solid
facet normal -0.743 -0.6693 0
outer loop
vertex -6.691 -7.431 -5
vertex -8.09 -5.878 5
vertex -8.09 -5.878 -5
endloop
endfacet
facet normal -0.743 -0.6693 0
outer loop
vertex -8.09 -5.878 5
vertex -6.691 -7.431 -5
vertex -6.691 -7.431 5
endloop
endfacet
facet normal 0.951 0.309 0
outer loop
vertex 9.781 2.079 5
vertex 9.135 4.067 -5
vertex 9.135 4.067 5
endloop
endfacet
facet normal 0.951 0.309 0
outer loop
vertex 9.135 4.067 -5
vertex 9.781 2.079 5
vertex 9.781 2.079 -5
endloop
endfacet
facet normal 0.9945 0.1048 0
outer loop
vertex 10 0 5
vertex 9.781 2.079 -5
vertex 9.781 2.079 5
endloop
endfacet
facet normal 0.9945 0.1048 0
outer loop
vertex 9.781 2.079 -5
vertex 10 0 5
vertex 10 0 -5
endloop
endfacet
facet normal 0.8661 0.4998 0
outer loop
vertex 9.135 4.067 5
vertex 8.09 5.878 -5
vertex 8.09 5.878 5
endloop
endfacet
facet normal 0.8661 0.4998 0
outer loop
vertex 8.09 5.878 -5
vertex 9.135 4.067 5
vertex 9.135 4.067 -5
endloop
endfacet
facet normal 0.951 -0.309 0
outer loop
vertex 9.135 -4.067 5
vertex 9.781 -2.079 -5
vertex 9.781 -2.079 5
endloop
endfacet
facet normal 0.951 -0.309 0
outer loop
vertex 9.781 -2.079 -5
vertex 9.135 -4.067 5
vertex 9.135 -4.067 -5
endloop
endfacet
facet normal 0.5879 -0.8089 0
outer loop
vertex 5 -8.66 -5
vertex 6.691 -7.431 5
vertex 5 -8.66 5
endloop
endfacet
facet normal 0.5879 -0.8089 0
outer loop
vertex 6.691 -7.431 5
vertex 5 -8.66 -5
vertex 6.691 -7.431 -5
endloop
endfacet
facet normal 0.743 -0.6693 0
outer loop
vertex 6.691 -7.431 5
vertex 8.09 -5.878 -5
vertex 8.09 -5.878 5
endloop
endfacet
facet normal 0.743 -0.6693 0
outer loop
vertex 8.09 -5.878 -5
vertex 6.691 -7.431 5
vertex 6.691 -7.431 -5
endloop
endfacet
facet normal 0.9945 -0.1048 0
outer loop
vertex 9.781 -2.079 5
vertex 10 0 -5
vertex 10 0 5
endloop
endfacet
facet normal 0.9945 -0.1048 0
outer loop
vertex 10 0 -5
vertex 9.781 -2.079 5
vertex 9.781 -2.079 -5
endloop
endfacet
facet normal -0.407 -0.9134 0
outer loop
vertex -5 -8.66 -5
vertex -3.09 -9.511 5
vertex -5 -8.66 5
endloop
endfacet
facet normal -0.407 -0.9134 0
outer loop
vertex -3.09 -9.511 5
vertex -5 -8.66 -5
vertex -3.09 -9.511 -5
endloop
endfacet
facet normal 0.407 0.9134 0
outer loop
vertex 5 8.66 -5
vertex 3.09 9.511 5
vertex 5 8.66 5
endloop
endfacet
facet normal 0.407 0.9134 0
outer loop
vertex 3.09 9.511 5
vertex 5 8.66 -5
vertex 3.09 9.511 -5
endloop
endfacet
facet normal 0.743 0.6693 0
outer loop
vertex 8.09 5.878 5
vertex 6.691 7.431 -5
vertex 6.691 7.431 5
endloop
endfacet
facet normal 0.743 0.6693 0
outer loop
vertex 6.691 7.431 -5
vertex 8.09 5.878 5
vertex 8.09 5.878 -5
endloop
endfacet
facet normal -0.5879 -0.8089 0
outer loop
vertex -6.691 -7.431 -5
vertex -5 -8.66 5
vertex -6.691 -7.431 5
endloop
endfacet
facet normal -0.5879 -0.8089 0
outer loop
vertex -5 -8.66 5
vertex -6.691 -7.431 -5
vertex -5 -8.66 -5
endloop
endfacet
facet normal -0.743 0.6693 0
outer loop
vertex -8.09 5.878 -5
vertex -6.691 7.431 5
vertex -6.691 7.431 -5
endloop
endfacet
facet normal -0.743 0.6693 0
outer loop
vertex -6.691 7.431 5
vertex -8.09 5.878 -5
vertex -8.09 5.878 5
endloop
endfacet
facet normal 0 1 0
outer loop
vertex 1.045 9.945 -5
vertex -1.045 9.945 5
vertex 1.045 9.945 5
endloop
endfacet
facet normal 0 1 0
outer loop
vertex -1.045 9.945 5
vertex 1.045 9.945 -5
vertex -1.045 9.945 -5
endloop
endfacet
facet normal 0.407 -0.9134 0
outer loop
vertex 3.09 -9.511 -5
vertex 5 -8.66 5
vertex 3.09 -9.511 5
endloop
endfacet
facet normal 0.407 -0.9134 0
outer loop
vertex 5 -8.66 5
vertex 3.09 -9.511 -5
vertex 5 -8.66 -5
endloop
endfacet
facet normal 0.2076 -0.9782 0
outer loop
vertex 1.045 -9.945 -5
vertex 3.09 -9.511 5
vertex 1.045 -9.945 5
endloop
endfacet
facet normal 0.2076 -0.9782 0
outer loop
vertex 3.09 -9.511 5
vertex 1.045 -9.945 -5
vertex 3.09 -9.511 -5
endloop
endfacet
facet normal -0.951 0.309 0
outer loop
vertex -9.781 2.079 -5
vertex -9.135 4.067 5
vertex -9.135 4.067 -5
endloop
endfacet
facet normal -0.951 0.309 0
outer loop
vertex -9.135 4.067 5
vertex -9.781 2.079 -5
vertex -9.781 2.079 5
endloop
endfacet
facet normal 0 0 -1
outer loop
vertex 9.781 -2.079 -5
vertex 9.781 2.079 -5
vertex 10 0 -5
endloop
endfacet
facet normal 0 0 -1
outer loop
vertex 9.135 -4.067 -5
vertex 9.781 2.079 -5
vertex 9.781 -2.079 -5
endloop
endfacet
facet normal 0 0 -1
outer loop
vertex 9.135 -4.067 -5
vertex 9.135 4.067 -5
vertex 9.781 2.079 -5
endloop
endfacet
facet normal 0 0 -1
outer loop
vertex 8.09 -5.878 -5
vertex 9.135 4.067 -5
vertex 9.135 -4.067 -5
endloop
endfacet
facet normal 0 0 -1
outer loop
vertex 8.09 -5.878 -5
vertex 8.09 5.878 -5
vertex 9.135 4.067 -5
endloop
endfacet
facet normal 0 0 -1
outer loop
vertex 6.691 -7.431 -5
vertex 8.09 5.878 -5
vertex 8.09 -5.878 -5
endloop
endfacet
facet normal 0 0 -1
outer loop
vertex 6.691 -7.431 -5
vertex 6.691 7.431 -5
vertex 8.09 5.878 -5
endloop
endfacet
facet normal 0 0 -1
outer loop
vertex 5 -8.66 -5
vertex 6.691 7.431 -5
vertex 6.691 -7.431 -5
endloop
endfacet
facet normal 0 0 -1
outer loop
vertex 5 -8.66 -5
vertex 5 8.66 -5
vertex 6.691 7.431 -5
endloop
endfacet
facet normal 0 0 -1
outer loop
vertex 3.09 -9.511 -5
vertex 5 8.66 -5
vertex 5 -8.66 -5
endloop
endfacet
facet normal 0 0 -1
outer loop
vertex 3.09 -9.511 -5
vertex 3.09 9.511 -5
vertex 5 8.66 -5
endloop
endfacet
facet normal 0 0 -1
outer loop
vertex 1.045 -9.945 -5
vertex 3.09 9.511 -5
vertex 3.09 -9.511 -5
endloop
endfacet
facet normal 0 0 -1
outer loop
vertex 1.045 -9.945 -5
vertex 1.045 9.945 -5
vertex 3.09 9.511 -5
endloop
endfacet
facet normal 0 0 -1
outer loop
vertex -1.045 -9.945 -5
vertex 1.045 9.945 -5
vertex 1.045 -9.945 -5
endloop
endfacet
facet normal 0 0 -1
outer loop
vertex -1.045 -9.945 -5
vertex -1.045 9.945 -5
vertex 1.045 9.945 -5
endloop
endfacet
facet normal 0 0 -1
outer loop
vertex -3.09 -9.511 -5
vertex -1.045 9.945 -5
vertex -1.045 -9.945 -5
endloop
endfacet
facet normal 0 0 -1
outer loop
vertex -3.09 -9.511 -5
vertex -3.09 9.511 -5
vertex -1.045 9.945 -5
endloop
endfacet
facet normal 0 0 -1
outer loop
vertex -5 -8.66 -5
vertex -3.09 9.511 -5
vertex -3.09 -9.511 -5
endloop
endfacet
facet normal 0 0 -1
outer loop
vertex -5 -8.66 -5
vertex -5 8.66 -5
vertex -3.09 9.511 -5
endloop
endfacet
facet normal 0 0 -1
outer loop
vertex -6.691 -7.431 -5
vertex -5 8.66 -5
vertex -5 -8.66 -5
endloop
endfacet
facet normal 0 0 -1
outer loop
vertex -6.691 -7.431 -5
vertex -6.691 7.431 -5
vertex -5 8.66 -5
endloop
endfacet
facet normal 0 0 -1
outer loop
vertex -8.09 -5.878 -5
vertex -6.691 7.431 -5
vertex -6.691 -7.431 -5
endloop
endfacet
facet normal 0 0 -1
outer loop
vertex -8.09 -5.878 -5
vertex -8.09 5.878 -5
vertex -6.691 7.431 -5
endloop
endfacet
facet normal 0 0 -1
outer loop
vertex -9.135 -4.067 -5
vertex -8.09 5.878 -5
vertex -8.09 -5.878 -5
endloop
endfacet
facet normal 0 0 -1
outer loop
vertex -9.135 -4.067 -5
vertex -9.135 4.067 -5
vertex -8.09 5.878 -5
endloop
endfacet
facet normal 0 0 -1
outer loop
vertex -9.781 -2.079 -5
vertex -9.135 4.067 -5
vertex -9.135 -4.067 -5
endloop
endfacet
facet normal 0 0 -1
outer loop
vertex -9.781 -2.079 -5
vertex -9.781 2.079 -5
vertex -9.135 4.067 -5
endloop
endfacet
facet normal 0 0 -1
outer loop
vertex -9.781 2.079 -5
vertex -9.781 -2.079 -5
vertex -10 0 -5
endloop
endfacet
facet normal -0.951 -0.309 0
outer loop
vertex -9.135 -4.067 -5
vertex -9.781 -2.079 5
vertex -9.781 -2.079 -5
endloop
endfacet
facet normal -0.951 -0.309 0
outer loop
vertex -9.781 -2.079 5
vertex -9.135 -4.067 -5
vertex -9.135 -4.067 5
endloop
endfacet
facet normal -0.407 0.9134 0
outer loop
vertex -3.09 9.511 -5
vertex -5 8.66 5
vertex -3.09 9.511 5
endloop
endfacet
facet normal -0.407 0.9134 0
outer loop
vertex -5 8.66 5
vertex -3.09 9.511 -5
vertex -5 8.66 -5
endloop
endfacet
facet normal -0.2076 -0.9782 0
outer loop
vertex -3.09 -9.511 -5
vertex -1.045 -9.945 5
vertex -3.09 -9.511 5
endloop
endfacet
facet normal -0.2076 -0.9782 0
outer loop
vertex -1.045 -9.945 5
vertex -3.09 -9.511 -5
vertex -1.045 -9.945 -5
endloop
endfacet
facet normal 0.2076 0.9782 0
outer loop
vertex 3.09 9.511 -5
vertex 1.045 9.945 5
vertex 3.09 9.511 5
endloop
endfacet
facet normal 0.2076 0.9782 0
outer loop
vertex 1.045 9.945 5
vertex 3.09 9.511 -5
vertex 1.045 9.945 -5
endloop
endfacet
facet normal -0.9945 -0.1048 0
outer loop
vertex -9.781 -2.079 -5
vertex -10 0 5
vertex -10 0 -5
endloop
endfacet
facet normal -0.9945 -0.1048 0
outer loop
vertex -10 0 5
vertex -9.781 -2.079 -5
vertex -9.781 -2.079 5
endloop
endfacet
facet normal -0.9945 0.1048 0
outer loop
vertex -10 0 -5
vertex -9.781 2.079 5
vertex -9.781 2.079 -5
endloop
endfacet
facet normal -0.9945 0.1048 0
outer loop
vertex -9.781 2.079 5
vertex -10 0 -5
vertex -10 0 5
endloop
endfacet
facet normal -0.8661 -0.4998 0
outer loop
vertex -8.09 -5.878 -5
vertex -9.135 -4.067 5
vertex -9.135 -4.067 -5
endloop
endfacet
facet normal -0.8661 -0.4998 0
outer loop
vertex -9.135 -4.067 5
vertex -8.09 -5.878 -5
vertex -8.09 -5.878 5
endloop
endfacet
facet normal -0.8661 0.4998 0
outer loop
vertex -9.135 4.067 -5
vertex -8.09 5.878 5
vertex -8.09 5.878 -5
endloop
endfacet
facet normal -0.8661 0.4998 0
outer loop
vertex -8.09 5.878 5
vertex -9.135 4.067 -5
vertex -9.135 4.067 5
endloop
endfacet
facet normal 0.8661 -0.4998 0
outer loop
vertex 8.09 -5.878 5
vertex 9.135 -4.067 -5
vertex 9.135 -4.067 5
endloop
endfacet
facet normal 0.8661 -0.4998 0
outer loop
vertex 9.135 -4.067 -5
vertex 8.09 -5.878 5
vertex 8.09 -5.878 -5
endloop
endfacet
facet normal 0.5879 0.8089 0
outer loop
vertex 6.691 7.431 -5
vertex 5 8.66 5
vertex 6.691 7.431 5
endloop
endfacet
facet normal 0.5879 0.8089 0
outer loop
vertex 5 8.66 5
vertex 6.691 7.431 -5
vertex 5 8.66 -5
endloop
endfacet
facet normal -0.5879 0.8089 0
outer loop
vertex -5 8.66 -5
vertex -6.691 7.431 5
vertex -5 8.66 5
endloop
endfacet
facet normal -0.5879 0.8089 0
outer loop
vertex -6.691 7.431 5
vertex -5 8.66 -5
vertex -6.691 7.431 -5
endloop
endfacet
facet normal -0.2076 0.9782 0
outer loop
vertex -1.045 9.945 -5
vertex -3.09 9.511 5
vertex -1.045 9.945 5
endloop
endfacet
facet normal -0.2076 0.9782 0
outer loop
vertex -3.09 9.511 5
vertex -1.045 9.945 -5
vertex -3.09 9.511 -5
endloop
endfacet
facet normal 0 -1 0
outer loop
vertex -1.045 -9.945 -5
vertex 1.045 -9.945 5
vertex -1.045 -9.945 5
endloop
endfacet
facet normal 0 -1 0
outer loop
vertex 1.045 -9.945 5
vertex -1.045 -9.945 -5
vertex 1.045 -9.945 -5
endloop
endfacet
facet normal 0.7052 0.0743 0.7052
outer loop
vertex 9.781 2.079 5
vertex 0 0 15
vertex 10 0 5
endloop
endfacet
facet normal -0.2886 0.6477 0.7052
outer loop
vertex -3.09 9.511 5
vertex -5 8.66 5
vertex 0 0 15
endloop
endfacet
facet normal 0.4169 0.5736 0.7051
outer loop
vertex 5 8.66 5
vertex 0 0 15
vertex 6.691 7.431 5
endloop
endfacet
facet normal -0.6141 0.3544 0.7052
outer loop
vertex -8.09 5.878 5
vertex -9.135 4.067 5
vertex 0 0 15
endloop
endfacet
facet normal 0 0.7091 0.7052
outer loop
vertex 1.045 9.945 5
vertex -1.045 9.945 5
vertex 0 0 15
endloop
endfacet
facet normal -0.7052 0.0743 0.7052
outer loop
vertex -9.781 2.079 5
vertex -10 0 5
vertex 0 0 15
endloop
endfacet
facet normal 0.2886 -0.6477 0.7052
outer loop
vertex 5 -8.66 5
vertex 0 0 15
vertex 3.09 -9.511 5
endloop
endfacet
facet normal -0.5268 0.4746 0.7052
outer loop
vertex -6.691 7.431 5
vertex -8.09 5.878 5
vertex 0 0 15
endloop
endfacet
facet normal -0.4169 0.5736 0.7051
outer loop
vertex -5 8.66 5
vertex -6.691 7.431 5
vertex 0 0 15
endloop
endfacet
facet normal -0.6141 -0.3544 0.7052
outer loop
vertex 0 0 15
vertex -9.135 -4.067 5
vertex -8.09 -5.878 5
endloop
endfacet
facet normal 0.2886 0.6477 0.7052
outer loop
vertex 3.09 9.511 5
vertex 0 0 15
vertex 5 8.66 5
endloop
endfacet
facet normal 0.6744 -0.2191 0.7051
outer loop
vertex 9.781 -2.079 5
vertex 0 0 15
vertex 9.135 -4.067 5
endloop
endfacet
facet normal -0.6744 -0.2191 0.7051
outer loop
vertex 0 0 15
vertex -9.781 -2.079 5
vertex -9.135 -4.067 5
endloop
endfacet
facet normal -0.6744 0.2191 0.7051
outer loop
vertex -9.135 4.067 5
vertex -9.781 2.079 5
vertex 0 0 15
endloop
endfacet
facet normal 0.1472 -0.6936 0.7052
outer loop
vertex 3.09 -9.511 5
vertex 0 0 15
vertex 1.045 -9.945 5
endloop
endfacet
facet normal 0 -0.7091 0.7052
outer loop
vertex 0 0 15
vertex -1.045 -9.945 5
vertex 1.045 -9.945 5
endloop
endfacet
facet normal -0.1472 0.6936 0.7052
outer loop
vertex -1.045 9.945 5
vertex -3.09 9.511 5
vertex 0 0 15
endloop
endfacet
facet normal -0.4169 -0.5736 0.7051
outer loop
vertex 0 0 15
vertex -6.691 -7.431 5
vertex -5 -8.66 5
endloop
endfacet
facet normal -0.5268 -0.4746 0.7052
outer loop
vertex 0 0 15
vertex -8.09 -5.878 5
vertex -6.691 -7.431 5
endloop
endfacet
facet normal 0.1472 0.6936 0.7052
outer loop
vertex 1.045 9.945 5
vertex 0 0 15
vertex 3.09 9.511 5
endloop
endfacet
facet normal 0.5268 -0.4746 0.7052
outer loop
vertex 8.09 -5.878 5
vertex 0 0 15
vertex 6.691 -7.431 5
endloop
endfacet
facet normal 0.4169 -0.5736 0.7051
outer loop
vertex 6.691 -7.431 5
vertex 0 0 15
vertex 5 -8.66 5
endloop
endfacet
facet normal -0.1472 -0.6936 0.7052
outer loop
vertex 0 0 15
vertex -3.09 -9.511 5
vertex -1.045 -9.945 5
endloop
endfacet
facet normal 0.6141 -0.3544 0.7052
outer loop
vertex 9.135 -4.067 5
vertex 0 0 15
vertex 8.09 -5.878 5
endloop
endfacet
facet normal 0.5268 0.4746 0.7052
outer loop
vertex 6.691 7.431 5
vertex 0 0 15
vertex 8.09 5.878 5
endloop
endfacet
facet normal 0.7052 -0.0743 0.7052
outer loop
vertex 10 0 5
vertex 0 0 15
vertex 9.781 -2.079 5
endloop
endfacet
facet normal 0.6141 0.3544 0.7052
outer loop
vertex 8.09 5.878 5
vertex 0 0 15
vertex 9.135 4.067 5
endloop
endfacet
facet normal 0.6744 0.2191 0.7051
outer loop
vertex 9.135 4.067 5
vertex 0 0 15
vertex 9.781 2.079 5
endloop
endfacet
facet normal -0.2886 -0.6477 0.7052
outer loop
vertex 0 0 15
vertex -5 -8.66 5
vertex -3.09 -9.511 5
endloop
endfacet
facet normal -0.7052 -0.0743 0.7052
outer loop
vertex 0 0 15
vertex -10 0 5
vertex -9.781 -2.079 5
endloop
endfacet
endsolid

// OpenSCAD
// Generated by SolidPython 1.0.5 on 2021-06-01 16:28:58


union() {
	cylinder(center = true, h = 10, r = 10);
	translate(v = [0, 0, 5]) {
		cylinder(h = 10, r1 = 10, r2 = 0);
	}
}
/***********************************************
*********      SolidPython code:      **********
************************************************
 
#! /usr/bin/env python3
import sys

from solid import scad_render_to_file
from solid.objects import cylinder
from solid.utils import up

SEGMENTS = 48


def show_appended_python_code():
    a = cylinder(r=10, h=10, center=True) + up(5)(cylinder(r1=10, r2=0, h=10))

    return a


if __name__ == '__main__':
    out_dir = sys.argv[1] if len(sys.argv) > 1 else None
    a = show_appended_python_code()

    # ================================================================
    # = include_orig_code appends all python code as comments to the
    # = bottom of the generated OpenSCAD code, so the final document
    # = contains the easy-to-read python code as well as the SCAD.
    # = ------------------------------------------------------------ =
    file_out = scad_render_to_file(a, out_dir=out_dir, include_orig_code=True)
    print(f"{__file__}: SCAD file written to: \n{file_out}")
 
 
************************************************/
